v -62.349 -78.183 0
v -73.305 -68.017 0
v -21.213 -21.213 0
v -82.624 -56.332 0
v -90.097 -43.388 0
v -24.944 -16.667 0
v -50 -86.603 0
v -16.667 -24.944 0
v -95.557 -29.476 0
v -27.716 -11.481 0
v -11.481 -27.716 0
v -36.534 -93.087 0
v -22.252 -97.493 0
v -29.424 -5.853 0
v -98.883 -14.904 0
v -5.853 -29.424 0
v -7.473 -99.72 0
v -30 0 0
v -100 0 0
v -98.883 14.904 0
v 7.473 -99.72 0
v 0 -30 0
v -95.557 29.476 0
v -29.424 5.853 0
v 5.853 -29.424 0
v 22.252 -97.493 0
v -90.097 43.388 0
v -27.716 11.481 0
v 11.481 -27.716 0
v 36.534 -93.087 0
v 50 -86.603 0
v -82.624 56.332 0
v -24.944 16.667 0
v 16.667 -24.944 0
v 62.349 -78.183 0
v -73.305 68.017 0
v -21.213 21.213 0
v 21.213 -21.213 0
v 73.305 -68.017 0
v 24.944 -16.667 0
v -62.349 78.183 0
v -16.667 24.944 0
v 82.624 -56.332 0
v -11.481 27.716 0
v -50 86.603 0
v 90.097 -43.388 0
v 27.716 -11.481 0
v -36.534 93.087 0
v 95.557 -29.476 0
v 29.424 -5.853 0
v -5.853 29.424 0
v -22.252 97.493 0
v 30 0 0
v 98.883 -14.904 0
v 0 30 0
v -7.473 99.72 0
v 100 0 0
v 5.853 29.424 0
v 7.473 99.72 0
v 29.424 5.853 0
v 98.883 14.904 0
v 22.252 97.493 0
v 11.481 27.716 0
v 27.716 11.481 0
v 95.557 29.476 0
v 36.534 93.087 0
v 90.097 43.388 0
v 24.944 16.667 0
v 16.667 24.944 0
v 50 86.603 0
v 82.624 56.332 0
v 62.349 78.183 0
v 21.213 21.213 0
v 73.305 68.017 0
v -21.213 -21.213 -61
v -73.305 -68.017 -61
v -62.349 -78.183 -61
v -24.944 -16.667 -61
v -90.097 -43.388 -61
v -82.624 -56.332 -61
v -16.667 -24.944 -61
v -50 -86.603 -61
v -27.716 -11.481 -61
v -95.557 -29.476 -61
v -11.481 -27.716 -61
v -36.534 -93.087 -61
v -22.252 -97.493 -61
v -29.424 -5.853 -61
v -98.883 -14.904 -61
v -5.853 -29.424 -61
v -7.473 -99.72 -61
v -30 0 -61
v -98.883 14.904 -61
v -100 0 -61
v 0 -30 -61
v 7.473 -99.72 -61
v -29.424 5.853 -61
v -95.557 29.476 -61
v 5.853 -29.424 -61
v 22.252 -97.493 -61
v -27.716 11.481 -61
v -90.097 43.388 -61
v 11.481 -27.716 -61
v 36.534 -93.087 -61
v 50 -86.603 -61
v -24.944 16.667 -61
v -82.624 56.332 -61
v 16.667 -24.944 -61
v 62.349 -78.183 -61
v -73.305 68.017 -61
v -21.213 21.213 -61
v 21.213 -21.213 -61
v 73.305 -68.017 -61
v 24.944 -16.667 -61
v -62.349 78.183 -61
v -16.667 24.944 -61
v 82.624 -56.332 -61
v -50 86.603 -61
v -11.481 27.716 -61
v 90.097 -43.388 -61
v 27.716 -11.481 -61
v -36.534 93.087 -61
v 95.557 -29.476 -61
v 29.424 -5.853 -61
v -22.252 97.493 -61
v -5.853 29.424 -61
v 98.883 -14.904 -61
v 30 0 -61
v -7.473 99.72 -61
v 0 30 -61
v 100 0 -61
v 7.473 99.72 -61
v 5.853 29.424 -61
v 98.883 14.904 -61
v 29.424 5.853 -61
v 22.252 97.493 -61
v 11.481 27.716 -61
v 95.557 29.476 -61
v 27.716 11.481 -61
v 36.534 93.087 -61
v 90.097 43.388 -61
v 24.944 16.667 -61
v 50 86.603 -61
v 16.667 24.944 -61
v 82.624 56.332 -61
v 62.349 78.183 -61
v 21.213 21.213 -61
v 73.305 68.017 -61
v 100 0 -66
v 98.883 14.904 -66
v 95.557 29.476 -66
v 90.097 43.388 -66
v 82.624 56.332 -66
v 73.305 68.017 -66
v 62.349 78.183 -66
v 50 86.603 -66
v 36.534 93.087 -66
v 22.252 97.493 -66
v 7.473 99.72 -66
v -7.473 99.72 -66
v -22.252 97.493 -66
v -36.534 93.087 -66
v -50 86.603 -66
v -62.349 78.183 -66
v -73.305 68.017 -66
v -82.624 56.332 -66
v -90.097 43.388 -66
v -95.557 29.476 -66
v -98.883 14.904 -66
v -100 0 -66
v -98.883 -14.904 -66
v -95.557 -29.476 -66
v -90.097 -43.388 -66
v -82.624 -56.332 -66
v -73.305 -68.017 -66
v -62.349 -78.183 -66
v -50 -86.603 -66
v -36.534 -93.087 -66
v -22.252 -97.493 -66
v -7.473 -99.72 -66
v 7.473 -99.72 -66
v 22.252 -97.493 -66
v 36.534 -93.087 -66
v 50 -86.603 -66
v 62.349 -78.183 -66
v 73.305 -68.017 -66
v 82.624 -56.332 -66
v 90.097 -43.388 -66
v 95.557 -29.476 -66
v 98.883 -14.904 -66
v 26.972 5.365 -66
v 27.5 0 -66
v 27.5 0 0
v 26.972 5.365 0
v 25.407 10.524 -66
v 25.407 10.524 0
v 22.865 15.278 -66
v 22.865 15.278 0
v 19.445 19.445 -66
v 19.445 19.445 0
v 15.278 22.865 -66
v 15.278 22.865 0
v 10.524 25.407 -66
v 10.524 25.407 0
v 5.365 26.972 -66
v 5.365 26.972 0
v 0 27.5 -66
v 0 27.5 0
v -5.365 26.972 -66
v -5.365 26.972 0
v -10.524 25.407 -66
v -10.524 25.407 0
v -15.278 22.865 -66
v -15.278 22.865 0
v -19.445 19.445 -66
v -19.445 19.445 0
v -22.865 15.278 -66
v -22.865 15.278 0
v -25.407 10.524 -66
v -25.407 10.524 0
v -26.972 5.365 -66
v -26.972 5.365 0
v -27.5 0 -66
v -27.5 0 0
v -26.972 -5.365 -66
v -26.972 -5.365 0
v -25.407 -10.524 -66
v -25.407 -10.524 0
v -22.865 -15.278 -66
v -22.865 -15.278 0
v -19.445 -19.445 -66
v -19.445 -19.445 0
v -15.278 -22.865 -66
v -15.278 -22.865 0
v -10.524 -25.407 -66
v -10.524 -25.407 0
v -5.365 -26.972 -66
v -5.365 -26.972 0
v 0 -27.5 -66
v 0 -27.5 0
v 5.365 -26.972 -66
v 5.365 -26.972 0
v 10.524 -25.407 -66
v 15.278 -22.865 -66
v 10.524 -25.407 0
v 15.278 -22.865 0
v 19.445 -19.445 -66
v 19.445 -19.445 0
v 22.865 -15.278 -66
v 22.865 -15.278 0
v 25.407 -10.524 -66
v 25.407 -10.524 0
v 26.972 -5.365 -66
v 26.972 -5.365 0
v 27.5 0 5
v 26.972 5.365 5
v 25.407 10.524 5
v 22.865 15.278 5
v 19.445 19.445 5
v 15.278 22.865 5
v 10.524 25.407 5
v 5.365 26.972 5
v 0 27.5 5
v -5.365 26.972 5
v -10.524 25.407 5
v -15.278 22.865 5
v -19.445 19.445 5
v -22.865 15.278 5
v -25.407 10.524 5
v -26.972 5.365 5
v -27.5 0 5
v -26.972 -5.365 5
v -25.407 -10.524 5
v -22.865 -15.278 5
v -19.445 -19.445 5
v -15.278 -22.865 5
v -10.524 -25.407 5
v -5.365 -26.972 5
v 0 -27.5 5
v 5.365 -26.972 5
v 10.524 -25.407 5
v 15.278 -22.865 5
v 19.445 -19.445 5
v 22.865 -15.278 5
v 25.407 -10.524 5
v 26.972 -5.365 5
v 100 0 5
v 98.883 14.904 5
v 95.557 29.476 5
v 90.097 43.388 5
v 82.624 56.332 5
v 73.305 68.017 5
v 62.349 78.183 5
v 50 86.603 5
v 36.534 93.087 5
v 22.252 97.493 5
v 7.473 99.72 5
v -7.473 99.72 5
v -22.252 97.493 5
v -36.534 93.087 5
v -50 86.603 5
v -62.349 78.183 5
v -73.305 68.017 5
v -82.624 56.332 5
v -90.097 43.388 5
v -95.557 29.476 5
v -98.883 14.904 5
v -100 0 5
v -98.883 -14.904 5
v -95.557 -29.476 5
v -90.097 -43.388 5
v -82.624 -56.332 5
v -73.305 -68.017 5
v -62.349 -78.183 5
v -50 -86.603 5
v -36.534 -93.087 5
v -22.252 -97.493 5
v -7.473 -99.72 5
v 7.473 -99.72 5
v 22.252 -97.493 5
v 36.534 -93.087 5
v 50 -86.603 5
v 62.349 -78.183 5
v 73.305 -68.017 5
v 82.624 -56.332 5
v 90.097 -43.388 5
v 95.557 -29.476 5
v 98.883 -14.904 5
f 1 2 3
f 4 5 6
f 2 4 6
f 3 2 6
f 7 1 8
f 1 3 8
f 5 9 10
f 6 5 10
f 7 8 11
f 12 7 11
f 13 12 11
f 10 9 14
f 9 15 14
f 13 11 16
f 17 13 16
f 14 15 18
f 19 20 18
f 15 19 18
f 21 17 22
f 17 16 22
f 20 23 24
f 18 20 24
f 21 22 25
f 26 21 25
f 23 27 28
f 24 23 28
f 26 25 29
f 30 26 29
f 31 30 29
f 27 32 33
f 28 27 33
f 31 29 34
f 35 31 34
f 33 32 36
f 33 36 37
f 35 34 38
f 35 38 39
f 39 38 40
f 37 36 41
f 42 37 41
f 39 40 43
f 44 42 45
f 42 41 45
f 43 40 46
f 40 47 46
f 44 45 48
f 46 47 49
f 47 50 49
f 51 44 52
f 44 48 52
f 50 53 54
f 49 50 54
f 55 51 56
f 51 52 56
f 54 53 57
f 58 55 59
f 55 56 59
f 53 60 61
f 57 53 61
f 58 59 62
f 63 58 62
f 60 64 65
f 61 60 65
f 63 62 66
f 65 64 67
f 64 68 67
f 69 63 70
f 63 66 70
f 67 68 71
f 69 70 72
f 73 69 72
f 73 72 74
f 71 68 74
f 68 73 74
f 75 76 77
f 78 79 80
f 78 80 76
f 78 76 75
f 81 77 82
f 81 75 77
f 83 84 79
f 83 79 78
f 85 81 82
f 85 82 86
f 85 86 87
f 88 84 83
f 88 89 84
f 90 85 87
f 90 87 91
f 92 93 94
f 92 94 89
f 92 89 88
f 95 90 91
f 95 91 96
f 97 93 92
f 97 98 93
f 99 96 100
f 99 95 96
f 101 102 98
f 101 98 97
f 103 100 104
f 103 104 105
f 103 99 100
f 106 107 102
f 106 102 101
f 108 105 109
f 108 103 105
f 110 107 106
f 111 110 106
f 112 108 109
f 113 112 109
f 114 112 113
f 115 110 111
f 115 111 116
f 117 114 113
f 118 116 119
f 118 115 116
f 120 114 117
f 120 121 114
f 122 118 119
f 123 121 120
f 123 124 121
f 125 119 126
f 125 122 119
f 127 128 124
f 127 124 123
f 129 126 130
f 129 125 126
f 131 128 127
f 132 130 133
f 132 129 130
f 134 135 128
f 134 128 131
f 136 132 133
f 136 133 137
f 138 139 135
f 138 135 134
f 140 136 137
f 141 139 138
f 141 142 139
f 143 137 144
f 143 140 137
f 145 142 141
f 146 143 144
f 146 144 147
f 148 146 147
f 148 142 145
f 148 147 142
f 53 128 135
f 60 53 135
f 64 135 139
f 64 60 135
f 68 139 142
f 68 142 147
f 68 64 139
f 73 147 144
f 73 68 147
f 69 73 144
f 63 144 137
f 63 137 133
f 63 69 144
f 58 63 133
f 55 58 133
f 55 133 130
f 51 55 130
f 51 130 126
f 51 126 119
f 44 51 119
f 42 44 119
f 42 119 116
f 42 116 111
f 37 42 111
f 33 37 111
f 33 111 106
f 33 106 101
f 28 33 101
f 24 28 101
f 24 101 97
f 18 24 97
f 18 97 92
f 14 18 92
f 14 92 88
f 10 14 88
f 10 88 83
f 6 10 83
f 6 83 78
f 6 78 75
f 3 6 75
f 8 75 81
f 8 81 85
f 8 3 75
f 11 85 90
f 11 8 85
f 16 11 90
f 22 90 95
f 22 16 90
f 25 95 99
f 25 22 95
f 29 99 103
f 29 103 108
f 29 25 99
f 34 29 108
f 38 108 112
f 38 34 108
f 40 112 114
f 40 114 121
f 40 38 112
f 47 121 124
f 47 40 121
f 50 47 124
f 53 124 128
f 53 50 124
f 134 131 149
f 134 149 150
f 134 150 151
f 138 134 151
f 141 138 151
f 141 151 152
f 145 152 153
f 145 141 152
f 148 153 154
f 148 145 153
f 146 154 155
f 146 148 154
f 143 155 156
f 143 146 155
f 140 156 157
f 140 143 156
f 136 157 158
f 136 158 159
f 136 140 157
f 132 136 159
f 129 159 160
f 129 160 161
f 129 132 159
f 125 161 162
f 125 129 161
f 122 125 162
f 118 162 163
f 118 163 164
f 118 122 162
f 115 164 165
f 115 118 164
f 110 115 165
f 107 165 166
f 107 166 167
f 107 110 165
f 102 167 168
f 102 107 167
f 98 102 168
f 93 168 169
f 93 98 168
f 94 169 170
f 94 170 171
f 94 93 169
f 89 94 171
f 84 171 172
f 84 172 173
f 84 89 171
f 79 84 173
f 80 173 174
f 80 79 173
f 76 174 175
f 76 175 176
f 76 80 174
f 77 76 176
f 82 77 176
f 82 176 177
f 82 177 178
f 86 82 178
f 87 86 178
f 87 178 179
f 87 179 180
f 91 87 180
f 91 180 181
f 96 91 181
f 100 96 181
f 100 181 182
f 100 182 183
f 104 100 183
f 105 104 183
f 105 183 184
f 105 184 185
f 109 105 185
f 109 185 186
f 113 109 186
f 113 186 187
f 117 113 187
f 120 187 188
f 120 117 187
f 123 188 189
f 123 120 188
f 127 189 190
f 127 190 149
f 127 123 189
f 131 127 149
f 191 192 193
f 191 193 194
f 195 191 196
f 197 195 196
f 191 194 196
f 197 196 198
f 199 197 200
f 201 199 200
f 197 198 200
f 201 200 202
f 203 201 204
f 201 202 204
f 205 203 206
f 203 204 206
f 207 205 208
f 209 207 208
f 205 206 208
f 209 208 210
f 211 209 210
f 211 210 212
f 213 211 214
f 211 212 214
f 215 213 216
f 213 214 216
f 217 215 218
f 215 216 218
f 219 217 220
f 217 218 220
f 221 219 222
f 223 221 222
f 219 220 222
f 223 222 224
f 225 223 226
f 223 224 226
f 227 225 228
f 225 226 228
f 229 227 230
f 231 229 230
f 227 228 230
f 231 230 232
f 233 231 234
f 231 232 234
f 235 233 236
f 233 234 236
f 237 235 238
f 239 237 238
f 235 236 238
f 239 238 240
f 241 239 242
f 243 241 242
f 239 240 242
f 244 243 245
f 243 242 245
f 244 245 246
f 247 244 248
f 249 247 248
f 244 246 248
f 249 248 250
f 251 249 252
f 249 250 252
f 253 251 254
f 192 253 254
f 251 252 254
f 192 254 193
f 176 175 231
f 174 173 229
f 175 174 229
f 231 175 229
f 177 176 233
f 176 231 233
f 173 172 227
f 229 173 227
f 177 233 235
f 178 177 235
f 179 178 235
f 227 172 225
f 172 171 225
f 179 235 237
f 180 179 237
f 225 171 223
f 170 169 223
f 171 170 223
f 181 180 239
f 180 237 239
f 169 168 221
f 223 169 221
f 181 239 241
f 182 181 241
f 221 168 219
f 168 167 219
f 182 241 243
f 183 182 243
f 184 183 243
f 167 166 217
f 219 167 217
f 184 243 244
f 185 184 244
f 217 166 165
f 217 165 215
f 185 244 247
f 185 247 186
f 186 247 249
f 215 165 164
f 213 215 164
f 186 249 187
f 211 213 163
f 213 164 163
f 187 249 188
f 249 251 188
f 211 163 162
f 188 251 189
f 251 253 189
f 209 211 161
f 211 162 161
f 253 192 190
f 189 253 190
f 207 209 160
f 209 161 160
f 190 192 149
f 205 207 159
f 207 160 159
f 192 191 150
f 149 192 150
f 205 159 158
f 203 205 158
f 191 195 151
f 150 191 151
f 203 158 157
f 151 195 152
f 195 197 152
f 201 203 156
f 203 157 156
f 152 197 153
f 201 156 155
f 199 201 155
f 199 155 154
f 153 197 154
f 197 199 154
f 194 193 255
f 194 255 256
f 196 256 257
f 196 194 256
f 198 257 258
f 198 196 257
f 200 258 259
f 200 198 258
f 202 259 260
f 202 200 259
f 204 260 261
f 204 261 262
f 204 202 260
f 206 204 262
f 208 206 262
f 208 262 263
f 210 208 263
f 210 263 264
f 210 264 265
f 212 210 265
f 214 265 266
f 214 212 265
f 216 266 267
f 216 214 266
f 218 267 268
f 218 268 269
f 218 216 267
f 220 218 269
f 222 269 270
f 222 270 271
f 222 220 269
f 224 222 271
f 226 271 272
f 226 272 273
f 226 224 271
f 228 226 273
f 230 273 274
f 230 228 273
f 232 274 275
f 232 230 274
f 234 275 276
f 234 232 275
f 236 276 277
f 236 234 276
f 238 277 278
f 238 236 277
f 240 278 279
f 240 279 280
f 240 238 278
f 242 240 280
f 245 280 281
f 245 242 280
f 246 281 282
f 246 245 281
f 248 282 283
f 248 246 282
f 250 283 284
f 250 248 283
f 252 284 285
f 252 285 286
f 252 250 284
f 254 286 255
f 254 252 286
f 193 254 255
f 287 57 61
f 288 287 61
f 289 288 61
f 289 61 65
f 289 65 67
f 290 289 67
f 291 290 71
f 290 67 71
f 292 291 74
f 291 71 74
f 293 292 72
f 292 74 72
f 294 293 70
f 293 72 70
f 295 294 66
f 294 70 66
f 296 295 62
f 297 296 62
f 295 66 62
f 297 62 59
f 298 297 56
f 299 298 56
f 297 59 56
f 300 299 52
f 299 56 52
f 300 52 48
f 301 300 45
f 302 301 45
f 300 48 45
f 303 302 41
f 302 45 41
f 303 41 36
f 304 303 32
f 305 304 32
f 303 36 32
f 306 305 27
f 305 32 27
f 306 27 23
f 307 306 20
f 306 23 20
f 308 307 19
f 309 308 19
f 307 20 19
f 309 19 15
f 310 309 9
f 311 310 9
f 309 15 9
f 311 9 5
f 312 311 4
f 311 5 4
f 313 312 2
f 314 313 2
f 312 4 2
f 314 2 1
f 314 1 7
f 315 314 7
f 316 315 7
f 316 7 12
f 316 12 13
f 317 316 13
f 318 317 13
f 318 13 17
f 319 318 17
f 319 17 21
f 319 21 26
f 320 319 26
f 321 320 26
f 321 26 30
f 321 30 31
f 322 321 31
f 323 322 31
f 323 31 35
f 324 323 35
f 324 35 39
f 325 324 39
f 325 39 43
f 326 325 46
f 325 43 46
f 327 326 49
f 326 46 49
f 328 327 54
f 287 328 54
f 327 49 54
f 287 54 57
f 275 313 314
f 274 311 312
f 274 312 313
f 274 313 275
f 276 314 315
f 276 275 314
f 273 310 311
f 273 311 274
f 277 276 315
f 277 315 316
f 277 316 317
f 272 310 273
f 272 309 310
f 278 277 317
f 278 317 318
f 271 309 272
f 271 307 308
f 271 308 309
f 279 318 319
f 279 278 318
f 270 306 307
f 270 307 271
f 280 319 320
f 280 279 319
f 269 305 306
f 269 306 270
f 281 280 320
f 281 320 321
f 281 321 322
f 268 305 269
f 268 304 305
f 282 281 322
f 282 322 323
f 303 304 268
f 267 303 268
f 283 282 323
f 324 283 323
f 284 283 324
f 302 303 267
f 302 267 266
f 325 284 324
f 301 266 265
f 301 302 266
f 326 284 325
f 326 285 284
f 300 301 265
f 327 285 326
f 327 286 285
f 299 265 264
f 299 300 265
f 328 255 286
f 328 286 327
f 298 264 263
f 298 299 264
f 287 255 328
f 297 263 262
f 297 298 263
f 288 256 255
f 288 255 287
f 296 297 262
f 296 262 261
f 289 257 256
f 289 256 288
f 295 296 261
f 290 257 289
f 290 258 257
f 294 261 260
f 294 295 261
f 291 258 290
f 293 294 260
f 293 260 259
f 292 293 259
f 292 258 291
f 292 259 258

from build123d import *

# Parameters (mm, degrees)
F0_R          = 100
F0_R_2        = 30
F1_DEPTH      = 5
F0_R_3        = 27.5
F2_DEPTH      = 5
F2_DEPTH_BACK = 66
F3_START      = -61
F3_DEPTH      = 5


with BuildPart() as f1:
    # F0 (on Top) → F1 (new body)
    with BuildSketch(Plane.XY):
        Circle(F0_R)
        Circle(F0_R_2, mode=Mode.SUBTRACT)
    extrude(amount=F1_DEPTH)

    # F0 (on Top) → F2 (join, two sides)
    with BuildSketch(Plane.XY) as f2_sk:
        Circle(F0_R_2)
        Circle(F0_R_3, mode=Mode.SUBTRACT)
    extrude(amount=F2_DEPTH)
    extrude(f2_sk.sketch, amount=-F2_DEPTH_BACK)

    # F0 (on Top) → F3 (join)
    with BuildSketch(Plane.XY.offset(F3_START)):
        Circle(F0_R)
        Circle(F0_R_2, mode=Mode.SUBTRACT)
    extrude(amount=-F3_DEPTH)


solid = f1.part
